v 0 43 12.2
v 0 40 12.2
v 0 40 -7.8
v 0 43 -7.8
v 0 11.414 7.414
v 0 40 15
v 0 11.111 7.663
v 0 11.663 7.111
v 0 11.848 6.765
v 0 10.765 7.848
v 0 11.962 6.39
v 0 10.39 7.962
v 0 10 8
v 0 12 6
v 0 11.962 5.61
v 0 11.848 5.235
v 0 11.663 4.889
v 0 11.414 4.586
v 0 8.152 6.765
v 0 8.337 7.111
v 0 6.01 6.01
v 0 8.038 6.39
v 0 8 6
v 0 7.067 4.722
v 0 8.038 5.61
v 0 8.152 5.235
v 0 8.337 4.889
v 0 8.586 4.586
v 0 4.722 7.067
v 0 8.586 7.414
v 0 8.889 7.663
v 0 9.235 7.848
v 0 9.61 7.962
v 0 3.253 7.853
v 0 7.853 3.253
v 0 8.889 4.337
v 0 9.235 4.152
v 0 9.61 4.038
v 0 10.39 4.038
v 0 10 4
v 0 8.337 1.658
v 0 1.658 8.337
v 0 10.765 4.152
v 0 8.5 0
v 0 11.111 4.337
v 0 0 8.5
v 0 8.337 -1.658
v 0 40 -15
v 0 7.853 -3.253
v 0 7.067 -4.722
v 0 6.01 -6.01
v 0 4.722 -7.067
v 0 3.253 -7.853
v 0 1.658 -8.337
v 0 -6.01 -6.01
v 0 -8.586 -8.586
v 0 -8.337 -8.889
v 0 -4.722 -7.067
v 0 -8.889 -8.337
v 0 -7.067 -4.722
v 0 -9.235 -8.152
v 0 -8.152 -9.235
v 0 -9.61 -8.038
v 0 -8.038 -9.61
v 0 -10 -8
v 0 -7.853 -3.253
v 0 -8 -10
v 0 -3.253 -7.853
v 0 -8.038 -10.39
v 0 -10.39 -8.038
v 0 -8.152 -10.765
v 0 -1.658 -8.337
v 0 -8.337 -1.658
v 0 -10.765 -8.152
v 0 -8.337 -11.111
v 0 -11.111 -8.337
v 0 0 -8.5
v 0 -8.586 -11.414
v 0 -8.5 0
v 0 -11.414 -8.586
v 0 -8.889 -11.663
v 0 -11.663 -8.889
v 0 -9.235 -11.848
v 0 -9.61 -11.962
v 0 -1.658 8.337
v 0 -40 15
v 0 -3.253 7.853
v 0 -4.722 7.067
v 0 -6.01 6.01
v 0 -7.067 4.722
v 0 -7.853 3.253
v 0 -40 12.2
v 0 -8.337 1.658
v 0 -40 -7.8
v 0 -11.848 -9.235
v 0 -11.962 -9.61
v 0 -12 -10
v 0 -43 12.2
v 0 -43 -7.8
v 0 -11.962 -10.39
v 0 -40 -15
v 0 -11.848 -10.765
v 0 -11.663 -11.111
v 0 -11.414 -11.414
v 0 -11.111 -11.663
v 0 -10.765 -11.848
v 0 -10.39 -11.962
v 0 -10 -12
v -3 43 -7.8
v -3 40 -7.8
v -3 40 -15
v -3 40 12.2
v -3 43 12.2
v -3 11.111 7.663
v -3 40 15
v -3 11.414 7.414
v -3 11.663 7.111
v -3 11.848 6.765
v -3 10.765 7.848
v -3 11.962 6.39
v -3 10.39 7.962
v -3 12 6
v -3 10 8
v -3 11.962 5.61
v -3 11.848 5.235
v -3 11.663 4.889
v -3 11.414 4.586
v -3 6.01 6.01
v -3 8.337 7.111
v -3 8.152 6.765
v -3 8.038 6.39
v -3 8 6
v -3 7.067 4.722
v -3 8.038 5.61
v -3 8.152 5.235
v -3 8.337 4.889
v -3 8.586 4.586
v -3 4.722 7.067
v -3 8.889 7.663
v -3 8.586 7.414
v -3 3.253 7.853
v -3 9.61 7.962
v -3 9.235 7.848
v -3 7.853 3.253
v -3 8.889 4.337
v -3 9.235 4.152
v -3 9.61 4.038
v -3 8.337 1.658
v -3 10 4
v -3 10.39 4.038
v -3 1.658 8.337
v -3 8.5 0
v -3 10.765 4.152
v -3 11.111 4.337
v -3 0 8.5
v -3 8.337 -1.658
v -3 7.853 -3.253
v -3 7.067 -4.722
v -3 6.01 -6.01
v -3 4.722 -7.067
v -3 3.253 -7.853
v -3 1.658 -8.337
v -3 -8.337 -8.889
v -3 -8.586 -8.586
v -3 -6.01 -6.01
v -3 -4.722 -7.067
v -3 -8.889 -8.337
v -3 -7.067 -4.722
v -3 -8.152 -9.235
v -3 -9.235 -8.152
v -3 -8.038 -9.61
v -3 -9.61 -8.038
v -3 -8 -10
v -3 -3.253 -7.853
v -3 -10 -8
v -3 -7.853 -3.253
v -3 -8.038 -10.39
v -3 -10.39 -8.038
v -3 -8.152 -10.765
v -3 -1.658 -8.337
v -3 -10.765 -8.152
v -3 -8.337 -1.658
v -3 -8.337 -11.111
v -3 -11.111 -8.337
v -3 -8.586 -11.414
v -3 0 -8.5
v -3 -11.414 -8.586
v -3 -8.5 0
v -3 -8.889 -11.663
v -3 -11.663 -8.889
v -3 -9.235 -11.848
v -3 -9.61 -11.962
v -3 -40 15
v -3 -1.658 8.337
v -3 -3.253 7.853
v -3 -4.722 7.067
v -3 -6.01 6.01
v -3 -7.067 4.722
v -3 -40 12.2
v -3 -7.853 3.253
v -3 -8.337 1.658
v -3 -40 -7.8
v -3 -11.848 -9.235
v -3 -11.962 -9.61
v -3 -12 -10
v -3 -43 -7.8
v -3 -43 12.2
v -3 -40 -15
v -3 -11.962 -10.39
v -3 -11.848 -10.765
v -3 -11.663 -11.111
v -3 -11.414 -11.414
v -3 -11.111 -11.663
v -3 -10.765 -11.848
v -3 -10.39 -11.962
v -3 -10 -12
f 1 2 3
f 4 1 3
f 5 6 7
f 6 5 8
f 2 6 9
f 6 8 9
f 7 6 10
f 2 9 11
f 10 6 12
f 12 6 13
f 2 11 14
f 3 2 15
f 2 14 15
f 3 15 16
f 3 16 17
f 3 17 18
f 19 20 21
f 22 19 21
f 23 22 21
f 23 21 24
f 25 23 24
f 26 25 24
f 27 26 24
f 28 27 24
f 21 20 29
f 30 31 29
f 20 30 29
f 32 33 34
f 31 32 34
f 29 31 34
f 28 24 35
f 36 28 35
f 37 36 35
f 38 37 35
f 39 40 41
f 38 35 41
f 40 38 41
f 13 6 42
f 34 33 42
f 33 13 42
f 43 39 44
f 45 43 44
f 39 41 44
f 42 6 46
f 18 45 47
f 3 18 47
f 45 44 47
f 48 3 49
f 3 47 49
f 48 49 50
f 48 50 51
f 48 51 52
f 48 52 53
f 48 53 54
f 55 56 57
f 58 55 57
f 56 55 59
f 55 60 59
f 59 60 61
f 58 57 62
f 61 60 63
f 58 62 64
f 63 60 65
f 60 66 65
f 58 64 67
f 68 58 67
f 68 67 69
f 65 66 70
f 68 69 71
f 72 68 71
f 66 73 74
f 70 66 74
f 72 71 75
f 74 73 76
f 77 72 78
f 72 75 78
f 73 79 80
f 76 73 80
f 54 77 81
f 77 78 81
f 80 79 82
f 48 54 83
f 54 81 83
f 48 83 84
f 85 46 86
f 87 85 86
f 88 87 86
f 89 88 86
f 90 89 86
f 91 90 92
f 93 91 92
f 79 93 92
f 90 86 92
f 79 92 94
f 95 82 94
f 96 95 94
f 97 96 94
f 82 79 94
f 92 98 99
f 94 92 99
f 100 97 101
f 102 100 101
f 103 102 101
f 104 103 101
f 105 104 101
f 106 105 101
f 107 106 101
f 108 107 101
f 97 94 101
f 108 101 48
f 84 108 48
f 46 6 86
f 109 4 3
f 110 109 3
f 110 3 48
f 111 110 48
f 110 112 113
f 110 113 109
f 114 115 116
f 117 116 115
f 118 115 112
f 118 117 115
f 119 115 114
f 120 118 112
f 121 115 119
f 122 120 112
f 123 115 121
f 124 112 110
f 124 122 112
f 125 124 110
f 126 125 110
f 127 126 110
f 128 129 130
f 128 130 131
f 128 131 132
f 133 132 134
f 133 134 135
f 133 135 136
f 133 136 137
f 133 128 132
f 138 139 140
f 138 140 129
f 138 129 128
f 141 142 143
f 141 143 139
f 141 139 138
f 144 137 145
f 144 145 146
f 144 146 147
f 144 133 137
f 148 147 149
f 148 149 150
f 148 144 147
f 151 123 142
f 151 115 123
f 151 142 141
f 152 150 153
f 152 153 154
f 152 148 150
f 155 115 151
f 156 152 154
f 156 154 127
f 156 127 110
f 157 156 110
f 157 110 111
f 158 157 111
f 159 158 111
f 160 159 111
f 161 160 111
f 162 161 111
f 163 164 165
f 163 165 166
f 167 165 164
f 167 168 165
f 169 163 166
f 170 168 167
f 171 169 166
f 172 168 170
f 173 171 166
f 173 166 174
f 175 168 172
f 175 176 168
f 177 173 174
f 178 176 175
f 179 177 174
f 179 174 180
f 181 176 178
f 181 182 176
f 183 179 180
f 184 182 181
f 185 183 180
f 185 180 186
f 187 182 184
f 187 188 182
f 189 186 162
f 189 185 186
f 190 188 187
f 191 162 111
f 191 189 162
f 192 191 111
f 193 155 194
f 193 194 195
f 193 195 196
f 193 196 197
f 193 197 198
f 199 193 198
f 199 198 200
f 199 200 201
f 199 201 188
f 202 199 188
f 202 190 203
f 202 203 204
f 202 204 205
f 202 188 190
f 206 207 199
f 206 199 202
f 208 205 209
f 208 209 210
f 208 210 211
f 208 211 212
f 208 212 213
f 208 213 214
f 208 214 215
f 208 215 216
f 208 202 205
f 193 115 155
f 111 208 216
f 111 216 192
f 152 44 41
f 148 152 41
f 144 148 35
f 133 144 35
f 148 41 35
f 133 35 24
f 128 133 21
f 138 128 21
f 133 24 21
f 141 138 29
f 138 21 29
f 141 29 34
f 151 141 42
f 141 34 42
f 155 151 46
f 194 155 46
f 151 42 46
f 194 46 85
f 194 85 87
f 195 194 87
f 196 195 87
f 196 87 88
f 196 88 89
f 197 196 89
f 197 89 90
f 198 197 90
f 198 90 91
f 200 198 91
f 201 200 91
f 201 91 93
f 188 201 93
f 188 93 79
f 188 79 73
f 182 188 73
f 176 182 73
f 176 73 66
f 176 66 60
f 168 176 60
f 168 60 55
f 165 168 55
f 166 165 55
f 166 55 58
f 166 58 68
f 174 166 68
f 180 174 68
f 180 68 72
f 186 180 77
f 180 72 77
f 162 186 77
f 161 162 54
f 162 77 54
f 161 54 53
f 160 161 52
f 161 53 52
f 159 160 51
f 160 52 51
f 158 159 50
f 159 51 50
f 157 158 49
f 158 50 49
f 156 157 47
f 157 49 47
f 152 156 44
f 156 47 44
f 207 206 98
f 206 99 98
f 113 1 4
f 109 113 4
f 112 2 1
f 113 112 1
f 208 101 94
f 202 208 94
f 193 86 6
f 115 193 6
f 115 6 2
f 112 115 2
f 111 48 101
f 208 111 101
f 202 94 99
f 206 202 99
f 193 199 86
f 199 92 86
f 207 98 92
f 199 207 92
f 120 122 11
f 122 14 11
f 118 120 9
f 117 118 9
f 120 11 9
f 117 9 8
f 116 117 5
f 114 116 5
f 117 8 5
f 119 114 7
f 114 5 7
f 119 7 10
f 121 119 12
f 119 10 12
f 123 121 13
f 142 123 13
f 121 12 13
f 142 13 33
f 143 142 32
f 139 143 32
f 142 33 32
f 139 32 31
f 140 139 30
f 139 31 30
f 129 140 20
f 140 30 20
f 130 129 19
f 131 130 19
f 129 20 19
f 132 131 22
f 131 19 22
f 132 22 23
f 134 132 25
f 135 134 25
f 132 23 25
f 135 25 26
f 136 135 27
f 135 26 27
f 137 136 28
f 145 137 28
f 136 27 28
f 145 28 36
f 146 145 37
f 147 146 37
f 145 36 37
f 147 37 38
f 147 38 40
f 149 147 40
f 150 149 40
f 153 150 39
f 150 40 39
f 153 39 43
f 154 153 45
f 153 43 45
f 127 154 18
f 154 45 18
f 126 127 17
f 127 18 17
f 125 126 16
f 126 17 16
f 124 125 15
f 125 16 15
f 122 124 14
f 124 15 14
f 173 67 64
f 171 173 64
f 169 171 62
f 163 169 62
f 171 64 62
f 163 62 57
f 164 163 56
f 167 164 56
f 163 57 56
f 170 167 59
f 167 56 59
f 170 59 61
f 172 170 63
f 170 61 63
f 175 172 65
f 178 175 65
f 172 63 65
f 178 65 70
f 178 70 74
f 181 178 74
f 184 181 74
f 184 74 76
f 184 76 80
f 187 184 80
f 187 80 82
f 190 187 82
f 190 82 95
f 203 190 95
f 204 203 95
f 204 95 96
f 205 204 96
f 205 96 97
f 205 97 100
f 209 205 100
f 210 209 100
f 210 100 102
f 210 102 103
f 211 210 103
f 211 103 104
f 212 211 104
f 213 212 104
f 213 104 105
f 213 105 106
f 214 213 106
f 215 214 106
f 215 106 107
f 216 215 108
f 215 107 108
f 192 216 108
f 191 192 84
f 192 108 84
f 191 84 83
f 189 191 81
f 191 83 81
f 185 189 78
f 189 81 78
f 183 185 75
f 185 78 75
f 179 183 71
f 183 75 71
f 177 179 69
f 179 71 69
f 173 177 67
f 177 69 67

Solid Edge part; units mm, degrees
sketch "Sketch1" plane through (0, 0, 0) normal (1, 0, 0) x (0, 1, 0)
  circle A0 centre (0, 0) radius 8.5
  circle A1 centre (10, 6) radius 2
  circle A2 centre (-10, -10) radius 2
  line L0 (40, 15) -> (40, 12.2)
  line L1 (40, 12.2) -> (43, 12.2)
  line L2 (43, 12.2) -> (43, -7.8)
  line L3 (43, -7.8) -> (40, -7.8)
  line L4 (40, -7.8) -> (40, -15)
  line L5 (40, -15) -> (-40, -15)
  line L6 (-40, -15) -> (-40, -7.8)
  line L7 (-40, -7.8) -> (-43, -7.8)
  line L8 (-43, -7.8) -> (-43, 12.2)
  line L9 (-43, 12.2) -> (-40, 12.2)
  line L10 (-40, 12.2) -> (-40, 15)
  line L11 (-40, 15) -> (40, 15)
  dimension "D1" = 17
  dimension "D2" = 80
  dimension "D3" = 3
  dimension "D4" = 20
  dimension "D5" = 30
  dimension "D6" = 20
  dimension "D7" = 6
  dimension "D8" = 10
  dimension "D9" = 10
  dimension "D10" = 15
  dimension "D11" = 2.8
extrude "Protrusion1" add sketch "Sketch1" against normal blind 3
properties material "Acier"
